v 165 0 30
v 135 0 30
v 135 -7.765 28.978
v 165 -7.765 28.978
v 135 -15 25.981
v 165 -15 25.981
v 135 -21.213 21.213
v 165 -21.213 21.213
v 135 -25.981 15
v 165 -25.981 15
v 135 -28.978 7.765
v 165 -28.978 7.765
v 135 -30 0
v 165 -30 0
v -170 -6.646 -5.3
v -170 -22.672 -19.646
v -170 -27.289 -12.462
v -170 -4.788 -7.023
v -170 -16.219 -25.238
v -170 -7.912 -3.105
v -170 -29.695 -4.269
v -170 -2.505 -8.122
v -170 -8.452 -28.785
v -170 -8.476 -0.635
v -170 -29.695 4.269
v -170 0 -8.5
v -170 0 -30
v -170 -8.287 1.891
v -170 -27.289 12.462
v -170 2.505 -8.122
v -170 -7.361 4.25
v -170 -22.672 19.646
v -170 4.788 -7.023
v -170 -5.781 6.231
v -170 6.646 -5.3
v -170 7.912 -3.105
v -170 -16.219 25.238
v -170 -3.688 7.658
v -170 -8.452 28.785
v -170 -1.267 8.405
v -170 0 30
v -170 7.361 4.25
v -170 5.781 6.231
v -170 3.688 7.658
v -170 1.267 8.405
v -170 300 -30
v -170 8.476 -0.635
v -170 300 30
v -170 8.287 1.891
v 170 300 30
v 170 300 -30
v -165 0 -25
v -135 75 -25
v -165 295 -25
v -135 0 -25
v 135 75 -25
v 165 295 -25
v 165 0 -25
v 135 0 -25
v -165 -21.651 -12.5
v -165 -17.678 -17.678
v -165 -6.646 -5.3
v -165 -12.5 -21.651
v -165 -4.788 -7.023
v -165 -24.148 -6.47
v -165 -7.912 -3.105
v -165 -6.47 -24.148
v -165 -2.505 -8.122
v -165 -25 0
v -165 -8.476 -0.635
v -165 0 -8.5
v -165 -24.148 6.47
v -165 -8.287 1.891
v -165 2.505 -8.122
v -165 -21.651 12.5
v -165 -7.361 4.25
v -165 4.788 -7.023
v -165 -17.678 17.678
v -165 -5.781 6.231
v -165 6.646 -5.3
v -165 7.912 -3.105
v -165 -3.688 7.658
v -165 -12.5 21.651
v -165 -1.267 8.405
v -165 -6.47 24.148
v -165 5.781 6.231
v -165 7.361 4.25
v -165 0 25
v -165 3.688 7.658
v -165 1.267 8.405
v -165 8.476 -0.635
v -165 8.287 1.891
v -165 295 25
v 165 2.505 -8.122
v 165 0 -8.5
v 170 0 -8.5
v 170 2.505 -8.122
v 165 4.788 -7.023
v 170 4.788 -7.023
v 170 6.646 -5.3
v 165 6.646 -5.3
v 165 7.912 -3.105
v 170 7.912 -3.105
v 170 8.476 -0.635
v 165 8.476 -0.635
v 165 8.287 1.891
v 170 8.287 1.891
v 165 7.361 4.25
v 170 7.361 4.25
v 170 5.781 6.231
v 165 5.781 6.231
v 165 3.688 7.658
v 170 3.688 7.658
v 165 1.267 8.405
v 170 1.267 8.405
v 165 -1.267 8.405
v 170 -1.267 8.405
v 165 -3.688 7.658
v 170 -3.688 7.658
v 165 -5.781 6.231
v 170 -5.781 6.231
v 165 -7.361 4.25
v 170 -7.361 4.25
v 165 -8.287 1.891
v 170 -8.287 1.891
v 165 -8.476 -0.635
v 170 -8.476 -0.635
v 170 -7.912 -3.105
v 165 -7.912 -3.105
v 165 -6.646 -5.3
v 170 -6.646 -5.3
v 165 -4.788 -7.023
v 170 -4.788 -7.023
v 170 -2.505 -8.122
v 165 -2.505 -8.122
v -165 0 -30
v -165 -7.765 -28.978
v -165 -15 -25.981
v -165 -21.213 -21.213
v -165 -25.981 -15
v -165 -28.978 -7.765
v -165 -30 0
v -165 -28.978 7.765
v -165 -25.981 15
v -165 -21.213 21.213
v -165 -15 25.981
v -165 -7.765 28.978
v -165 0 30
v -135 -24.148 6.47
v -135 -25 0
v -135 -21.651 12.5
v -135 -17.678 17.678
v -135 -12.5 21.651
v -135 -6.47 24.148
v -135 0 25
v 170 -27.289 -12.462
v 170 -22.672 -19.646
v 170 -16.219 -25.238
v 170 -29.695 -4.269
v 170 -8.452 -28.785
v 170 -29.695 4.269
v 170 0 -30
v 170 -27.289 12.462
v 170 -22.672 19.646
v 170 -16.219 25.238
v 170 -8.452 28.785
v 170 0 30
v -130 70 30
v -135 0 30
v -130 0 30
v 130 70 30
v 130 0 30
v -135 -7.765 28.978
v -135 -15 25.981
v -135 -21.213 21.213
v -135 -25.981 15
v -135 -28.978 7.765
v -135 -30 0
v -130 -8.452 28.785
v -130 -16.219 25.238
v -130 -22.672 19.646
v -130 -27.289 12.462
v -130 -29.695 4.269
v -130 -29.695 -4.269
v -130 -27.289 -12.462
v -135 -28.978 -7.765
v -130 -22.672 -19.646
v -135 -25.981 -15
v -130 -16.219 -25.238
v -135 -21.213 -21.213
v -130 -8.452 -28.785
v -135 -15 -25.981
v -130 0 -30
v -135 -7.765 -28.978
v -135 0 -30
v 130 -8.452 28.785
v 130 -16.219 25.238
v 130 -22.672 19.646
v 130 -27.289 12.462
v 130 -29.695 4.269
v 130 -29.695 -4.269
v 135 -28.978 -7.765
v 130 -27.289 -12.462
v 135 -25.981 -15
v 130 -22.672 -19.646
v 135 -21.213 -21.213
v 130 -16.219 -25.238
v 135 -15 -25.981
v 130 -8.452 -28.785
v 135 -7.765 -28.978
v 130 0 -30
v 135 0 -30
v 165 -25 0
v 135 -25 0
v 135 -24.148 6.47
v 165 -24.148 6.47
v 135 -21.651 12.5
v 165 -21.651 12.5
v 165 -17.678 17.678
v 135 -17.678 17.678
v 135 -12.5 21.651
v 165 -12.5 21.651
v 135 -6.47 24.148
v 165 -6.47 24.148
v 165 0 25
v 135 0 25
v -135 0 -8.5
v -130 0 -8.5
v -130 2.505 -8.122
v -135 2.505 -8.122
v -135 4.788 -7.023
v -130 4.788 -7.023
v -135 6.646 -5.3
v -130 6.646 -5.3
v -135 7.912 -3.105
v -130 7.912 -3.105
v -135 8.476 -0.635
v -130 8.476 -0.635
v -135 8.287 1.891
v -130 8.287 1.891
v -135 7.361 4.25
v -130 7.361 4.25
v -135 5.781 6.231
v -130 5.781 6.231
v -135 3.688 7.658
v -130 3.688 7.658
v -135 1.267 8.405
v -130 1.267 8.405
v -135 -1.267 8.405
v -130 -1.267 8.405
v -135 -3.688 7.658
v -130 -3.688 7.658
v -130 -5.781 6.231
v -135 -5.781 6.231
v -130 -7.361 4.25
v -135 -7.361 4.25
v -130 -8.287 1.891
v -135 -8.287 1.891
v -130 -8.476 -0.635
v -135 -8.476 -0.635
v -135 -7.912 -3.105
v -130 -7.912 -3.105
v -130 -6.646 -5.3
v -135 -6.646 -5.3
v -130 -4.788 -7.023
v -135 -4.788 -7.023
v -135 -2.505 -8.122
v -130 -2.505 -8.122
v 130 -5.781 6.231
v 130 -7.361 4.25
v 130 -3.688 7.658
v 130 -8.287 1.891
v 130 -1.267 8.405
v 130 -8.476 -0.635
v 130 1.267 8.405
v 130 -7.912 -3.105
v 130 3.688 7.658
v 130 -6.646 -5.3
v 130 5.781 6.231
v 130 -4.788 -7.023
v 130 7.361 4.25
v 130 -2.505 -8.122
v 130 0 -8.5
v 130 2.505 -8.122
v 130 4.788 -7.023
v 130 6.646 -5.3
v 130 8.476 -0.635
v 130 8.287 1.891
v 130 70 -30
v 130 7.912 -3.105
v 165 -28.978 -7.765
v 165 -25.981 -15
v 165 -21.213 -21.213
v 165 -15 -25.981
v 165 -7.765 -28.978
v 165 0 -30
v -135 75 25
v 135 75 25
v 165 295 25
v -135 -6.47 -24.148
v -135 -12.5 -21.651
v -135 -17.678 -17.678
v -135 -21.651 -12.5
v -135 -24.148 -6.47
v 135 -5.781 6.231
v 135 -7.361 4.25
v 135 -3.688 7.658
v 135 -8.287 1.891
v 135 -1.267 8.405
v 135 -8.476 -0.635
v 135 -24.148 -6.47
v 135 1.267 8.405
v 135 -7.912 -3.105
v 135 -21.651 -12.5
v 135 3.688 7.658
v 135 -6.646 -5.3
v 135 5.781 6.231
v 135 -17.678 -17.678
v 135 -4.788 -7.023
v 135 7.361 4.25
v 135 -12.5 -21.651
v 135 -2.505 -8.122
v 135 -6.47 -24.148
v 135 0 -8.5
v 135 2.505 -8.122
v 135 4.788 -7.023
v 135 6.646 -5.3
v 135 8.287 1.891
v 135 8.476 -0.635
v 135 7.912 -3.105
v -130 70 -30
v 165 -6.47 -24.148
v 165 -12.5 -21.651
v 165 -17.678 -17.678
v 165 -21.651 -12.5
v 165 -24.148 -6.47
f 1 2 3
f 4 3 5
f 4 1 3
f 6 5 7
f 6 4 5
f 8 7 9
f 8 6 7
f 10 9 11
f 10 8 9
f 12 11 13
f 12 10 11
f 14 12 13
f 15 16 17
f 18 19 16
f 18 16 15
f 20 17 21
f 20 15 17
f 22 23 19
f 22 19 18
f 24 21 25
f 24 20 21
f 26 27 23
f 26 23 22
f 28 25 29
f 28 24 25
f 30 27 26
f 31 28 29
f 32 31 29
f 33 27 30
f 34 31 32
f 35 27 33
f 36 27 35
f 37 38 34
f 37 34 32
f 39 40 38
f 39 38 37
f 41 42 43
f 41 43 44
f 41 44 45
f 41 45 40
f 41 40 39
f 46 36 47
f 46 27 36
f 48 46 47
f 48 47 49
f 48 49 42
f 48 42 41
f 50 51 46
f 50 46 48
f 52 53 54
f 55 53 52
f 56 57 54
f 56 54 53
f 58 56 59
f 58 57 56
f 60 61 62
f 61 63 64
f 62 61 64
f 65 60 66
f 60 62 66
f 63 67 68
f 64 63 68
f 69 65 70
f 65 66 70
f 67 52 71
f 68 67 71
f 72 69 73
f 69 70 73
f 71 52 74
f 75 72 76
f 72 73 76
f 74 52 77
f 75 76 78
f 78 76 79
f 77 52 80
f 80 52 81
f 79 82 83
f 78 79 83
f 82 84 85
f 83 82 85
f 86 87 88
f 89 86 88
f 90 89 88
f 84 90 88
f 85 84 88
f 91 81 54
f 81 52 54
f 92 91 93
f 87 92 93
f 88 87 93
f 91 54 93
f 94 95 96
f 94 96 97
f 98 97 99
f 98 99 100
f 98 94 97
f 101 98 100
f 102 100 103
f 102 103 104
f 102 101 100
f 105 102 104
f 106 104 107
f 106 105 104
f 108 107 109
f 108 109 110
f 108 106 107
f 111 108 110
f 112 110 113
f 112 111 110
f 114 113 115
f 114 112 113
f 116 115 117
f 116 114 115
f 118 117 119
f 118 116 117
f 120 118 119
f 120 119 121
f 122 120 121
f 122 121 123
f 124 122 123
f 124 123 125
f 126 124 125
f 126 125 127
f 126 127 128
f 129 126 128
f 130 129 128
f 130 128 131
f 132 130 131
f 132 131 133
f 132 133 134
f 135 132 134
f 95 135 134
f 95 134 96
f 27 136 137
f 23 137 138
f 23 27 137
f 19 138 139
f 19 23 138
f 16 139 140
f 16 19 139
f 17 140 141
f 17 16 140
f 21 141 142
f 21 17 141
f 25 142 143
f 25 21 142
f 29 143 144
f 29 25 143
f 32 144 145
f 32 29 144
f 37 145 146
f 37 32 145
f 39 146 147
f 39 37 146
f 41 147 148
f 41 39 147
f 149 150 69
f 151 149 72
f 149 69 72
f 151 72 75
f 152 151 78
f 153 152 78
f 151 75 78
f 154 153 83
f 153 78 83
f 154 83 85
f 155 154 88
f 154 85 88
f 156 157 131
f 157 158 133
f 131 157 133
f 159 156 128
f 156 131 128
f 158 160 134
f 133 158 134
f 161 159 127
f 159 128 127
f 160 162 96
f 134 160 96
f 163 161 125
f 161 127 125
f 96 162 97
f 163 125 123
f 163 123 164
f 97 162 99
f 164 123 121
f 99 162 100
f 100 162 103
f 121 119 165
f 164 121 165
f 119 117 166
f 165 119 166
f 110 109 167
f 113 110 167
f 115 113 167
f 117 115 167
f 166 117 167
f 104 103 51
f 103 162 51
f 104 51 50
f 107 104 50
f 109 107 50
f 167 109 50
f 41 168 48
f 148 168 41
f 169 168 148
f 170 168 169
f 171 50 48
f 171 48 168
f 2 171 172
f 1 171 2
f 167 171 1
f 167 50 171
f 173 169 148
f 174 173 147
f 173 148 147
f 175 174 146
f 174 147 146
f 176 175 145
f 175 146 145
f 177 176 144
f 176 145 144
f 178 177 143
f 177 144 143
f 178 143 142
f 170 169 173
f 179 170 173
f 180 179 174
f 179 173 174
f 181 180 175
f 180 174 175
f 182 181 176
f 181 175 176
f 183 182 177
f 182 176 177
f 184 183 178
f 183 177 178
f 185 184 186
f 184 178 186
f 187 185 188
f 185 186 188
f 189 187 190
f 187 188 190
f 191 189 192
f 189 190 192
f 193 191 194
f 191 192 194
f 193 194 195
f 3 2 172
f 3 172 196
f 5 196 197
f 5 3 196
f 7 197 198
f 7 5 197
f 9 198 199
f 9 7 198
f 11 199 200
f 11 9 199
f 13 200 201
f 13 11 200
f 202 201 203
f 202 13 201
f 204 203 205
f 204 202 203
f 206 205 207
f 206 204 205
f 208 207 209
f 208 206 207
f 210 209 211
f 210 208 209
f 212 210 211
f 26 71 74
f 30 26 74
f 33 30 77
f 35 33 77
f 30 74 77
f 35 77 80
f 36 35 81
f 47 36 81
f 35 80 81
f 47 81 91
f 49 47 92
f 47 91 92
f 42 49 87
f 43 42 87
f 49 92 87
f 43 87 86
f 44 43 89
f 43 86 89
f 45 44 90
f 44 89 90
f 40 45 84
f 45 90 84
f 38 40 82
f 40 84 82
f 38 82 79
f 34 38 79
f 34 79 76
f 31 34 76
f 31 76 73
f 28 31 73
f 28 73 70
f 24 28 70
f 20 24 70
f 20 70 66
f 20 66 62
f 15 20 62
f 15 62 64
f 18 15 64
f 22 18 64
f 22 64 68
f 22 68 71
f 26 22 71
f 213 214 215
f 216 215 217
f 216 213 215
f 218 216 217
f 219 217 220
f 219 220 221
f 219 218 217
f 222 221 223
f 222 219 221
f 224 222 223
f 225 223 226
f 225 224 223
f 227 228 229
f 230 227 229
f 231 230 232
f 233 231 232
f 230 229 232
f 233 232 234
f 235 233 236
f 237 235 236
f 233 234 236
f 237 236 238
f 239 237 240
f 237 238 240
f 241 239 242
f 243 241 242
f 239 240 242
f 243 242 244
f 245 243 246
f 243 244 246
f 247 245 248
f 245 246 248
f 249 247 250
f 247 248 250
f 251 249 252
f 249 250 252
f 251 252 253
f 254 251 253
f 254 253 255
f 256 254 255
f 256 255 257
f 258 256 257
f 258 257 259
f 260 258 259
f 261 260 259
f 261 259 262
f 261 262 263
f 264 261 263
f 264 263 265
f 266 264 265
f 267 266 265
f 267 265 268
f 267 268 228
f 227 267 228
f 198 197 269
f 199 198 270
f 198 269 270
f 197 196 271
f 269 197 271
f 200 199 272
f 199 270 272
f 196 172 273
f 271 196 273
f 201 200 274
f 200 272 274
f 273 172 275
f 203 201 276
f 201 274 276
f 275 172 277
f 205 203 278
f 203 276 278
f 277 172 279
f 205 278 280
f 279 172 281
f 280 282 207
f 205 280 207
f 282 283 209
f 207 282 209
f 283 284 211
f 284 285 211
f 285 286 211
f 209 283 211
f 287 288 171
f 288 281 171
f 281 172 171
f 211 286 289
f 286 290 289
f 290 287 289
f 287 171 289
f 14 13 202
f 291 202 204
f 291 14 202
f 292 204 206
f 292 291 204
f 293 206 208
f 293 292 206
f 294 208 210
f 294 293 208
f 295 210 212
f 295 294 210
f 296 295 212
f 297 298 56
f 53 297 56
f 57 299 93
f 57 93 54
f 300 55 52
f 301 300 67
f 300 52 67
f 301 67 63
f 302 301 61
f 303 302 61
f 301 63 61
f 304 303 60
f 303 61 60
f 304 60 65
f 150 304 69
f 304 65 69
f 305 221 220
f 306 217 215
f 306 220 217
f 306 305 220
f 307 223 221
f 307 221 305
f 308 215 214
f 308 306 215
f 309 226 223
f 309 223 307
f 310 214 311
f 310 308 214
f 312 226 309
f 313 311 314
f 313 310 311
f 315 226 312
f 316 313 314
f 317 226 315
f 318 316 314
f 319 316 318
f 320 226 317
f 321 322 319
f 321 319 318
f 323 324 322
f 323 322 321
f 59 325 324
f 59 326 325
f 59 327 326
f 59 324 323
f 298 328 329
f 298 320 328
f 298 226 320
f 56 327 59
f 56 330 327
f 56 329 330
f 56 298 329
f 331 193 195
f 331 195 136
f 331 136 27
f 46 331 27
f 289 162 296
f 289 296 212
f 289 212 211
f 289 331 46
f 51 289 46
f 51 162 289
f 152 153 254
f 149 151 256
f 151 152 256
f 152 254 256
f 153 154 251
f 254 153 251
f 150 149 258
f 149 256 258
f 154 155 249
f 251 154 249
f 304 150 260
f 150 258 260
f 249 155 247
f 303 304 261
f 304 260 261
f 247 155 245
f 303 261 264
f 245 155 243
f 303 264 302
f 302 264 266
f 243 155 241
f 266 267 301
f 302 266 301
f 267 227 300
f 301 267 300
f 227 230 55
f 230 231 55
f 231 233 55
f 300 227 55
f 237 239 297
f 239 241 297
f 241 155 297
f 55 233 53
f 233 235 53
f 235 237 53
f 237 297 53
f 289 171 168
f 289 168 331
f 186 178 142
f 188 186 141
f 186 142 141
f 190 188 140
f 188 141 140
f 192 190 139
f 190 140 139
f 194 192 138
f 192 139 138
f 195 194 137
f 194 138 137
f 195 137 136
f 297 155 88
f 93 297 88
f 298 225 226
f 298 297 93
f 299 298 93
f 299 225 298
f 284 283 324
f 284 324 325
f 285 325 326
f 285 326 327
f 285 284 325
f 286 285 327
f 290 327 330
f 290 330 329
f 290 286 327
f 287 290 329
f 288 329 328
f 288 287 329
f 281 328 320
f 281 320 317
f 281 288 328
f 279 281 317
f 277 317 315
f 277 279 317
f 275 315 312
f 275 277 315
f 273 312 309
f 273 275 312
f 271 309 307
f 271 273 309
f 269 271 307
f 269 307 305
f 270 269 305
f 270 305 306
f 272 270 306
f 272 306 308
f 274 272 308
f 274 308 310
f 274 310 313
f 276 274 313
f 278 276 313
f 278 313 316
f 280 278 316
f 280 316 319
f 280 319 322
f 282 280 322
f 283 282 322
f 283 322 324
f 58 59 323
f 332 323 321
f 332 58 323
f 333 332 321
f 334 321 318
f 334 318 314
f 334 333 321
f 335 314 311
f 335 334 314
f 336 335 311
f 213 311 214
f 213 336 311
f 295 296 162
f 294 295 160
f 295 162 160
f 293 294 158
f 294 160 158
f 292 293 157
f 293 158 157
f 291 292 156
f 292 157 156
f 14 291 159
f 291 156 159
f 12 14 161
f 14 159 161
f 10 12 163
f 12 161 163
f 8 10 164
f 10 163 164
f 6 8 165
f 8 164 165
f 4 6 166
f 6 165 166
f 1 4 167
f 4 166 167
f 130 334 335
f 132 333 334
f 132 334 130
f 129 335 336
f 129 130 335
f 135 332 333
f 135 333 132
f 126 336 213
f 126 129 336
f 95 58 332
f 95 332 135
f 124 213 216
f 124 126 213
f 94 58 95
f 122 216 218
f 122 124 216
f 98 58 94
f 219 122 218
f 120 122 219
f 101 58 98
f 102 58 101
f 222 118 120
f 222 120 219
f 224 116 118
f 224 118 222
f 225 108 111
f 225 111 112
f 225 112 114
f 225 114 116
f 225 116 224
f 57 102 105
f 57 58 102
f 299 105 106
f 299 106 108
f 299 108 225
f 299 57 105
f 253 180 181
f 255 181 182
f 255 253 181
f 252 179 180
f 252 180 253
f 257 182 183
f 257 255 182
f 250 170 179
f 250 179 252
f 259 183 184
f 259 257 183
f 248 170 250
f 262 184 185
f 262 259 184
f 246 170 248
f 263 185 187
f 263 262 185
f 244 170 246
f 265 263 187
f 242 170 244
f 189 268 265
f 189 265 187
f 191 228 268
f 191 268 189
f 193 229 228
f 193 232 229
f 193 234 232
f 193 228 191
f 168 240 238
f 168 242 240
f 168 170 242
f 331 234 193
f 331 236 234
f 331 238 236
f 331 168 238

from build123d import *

# Parameters (mm, degrees)
BOSS_EXTRUDE1_START = -170
BOSS_EXTRUDE1_DEPTH = 5
BOSS_EXTRUDE2_START = -165
SKETCH3_4_W         = 5
SKETCH3_4_H         = 5
BOSS_EXTRUDE2_DEPTH = 30
BOSS_EXTRUDE3_START = -135
SKETCH3_5_W         = 50
SKETCH3_5_H         = 220
BOSS_EXTRUDE3_DEPTH = 5
BOSS_EXTRUDE4_START = -130
SKETCH3_6_W         = 5
SKETCH3_6_H         = 5
SKETCH3_6_W_2       = 50
BOSS_EXTRUDE4_DEPTH = 130
SKETCH6_R           = 8.5
CUT_EXTRUDE1_DEPTH  = 347.121365998


with BuildPart() as part:
    # Sketch3 → Boss-Extrude1 (new body)
    with BuildSketch(Plane(origin=(0, 0, 0), x_dir=(0, 0, -1), z_dir=(1, 0, 0)).offset(BOSS_EXTRUDE1_START)):
        with BuildLine():
            Line((-30, 0), (-30, 300))
            Line((-30, 300), (30, 300))
            Line((30, 300), (30, 0))
            ThreePointArc((30, 0), (0, -30), (-30, 0))
        make_face()
    extrude(amount=BOSS_EXTRUDE1_DEPTH)

    # Sketch3<4> → Boss-Extrude2 (add)
    with BuildSketch(Plane(origin=(0, 0, 0), x_dir=(0, 0, -1), z_dir=(1, 0, 0)).offset(BOSS_EXTRUDE2_START)):
        Polygon((-30, 75), (-25, 75), (-25, 295), (25, 295), (25, 75), (30, 75), (30, 300), (-30, 300), align=None)
        with Locations((-27.5, 72.5)):
            Rectangle(SKETCH3_4_W, SKETCH3_4_H)
        with BuildLine():
            Line((0, -30), (0, -25))
            ThreePointArc((0, -25), (-17.67766953, -17.67766953), (-25, 0))
            Line((-25, 0), (-25, 70))
            Line((-25, 70), (-30, 70))
            Line((-30, 70), (-30, 0))
            ThreePointArc((-30, 0), (-21.213203436, -21.213203436), (0, -30))
        make_face()
        with Locations((27.5, 72.5)):
            Rectangle(SKETCH3_4_W, SKETCH3_4_H)
        with BuildLine():
            ThreePointArc((25, 0), (17.67766953, -17.67766953), (0, -25))
            Line((0, -25), (0, -30))
            ThreePointArc((0, -30), (21.213203436, -21.213203436), (30, 0))
            Line((30, 0), (30, 70))
            Line((30, 70), (25, 70))
            Line((25, 70), (25, 0))
        make_face()
    extrude(amount=BOSS_EXTRUDE2_DEPTH)

    # Sketch3<5> → Boss-Extrude3 (add)
    with BuildSketch(Plane(origin=(0, 0, 0), x_dir=(0, 0, -1), z_dir=(1, 0, 0)).offset(BOSS_EXTRUDE3_START)):
        with BuildLine():
            ThreePointArc((-30, 0), (0, -30), (30, 0))
            Line((30, 0), (30, 300))
            Line((30, 300), (-30, 300))
            Line((-30, 300), (-30, 0))
        make_face()
        with Locations((0, 185)):
            Rectangle(SKETCH3_5_W, SKETCH3_5_H, mode=Mode.SUBTRACT)
    extrude(amount=BOSS_EXTRUDE3_DEPTH)

    # Sketch3<6> → Boss-Extrude4 (add)
    with BuildSketch(Plane(origin=(0, 0, 0), x_dir=(0, 0, -1), z_dir=(1, 0, 0)).offset(BOSS_EXTRUDE4_START)):
        Polygon((-30, 300), (-30, 75), (-25, 75), (-25, 295), (25, 295), (25, 75), (30, 75), (30, 300), align=None)
        with Locations((-27.5, 72.5)):
            Rectangle(SKETCH3_6_W, SKETCH3_6_H)
        with Locations((0, 72.5)):
            Rectangle(SKETCH3_6_W_2, SKETCH3_6_H)
        with Locations((27.5, 72.5)):
            Rectangle(SKETCH3_6_W, SKETCH3_6_H)
    extrude(amount=BOSS_EXTRUDE4_DEPTH)

    # Sketch6 → Cut-Extrude1 (cut, through all)
    with BuildSketch(Plane(origin=(0, 0, 0), x_dir=(0, 0, -1), z_dir=(1, 0, 0))):
        Circle(SKETCH6_R)
    extrude(amount=-CUT_EXTRUDE1_DEPTH, mode=Mode.SUBTRACT)

    # Mirror5: part across plane


with BuildPart() as part_1:
    add(part.part)
    add(part.part.mirror(Plane(origin=(0, 0, 0), x_dir=(0, 0, 1), z_dir=(1, 0, 0))))


solid = part_1.part
